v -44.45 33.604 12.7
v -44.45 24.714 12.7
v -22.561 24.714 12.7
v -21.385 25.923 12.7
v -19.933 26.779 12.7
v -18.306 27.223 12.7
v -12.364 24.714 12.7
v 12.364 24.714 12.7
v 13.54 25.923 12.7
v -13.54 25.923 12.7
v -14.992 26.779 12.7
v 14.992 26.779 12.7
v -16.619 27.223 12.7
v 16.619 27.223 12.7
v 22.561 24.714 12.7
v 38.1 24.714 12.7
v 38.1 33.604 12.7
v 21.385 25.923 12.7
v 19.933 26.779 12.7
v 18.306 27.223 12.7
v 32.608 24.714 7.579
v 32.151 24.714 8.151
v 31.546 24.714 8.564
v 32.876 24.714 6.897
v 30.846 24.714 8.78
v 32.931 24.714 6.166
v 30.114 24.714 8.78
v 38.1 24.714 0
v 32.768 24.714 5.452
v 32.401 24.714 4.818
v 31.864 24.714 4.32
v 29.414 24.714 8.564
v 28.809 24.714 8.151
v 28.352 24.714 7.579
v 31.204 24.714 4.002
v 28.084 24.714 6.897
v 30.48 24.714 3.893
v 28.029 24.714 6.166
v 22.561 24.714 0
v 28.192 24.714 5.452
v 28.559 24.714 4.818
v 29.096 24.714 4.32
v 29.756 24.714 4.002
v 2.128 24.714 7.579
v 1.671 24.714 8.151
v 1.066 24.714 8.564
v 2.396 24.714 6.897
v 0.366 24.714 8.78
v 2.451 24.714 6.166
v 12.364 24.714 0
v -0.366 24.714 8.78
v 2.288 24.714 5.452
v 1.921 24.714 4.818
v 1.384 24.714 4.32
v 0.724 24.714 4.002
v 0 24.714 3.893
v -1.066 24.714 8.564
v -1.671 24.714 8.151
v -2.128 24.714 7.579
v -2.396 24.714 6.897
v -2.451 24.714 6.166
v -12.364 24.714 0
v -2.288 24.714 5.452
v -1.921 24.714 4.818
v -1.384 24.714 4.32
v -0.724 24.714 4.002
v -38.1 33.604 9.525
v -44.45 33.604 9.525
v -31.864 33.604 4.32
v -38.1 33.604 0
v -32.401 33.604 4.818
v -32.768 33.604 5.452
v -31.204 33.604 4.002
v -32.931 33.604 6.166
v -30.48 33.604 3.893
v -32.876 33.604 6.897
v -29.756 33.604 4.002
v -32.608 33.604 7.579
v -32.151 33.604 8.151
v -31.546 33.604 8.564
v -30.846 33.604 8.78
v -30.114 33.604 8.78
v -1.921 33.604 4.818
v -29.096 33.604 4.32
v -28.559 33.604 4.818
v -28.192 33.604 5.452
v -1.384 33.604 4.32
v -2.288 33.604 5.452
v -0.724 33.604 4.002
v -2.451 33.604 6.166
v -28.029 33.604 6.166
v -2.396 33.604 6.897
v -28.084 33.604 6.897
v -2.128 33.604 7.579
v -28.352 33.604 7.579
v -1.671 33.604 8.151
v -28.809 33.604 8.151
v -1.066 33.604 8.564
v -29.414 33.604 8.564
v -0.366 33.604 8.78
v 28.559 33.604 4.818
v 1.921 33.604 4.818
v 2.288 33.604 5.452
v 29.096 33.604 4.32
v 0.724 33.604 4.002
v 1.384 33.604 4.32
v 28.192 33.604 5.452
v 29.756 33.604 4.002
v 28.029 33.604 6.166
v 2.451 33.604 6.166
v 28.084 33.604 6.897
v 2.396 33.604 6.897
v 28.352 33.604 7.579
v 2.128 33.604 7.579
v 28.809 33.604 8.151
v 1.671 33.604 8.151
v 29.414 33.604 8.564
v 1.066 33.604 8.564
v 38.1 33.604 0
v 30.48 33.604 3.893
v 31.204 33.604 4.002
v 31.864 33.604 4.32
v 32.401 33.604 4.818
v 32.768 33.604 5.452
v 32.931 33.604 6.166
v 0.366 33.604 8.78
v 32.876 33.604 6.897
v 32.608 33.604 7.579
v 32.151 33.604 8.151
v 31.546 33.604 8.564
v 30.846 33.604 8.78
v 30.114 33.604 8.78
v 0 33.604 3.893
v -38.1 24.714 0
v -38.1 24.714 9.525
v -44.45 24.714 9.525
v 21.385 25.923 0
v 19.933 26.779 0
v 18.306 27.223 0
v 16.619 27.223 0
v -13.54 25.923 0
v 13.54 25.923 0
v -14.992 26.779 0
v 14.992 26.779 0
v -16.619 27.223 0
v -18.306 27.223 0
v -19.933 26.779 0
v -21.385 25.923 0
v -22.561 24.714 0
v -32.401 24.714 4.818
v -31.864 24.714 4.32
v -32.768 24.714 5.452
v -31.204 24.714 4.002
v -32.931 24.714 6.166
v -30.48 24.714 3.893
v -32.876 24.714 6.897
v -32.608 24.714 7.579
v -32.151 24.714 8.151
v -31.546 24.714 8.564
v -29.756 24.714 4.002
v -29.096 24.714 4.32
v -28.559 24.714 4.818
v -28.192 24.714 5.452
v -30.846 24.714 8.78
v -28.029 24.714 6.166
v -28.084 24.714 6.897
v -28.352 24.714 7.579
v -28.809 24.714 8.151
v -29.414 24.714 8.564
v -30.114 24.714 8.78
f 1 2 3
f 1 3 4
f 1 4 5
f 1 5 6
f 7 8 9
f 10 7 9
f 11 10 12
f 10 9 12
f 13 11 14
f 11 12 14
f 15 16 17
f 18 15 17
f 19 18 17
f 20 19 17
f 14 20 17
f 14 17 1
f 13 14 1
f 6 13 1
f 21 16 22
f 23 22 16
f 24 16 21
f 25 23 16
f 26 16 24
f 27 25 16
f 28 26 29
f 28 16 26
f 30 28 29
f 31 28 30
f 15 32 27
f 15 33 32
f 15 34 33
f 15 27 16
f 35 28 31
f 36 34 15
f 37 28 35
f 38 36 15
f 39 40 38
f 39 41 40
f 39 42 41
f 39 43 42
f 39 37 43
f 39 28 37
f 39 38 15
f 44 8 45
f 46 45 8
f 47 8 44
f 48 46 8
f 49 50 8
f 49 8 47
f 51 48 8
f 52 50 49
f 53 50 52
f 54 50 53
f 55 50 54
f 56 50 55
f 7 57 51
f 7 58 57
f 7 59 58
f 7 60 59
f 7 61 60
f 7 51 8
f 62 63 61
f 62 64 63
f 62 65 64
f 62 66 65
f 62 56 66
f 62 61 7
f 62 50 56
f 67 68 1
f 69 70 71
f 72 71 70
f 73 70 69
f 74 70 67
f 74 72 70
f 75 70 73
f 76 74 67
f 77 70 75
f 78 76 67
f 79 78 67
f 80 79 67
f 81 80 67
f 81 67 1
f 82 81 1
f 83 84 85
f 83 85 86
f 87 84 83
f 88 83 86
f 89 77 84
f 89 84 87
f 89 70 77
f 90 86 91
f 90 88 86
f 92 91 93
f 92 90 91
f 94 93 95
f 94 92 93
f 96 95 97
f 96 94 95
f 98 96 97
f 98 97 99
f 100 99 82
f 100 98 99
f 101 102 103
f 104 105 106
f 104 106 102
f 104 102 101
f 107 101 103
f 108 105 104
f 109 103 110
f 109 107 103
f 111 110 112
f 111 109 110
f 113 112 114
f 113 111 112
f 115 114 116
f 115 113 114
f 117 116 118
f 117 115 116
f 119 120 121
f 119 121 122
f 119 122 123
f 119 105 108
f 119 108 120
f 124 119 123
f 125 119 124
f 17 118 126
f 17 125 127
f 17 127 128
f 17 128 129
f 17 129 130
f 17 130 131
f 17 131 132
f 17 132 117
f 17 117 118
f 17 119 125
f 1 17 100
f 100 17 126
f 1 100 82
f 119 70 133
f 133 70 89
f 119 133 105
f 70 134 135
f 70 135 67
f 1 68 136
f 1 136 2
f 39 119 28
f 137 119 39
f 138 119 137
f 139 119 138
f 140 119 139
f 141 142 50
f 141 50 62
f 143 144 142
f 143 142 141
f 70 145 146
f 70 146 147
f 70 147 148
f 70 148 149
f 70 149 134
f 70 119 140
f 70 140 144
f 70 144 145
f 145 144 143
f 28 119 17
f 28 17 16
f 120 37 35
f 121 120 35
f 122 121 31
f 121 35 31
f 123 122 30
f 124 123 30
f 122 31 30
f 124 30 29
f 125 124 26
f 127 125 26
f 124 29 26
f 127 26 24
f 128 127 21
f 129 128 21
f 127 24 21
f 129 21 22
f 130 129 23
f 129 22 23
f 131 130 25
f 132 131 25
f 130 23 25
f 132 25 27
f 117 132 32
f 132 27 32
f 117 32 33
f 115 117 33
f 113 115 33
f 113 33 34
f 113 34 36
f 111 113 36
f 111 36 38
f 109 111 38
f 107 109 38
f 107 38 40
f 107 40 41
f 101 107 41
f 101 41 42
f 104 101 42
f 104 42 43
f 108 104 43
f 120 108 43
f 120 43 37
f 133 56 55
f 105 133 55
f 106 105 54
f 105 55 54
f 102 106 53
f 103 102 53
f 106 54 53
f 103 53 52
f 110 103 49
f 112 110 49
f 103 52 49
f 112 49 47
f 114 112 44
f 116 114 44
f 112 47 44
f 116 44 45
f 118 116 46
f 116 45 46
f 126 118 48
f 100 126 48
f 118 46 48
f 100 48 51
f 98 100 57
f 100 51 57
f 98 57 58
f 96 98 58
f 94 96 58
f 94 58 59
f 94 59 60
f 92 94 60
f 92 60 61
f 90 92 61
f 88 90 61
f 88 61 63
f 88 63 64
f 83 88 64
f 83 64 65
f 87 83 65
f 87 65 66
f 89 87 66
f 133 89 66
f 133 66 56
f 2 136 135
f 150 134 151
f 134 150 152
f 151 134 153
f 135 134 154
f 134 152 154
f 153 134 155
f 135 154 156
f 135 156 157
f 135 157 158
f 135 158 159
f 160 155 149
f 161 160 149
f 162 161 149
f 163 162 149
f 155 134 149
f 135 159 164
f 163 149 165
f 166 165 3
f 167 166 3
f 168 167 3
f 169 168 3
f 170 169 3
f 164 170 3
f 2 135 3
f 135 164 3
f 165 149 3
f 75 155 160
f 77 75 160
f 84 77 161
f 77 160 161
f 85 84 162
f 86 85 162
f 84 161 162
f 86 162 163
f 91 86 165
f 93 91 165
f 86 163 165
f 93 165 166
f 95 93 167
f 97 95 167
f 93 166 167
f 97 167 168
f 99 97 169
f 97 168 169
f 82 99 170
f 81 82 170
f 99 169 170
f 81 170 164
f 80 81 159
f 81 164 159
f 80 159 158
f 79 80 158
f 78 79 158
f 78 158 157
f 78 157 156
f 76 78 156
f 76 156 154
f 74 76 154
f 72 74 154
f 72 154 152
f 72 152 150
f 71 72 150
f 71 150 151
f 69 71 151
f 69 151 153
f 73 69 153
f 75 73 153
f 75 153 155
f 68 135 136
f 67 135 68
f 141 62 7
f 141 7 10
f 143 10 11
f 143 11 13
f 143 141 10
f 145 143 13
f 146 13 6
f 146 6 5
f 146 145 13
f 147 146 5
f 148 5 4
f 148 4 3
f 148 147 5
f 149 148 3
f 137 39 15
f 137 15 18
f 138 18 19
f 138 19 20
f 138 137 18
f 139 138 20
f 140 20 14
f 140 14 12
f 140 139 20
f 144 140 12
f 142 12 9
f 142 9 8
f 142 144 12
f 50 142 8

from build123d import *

# Parameters (mm, degrees)
BOSS_EXTRUDE1_DEPTH          = 12.7
SKETCH2_W                    = 3.175
SKETCH2_H                    = 8.89
BOSS_EXTRUDE2_DEPTH          = 6.35
F_10_0_1935_DIAMETER_HOLE1_D = 4.9149


with BuildPart() as part:
    # Sketch1 → Boss-Extrude1 (new body)
    with BuildSketch(Plane.XY):
        with BuildLine():
            Line((38.1, 33.6042), (38.1, 24.7142))
            Line((38.1, 24.7142), (22.561451151, 24.7142))
            ThreePointArc((22.561451151, 24.7142), (17.4625, 27.2796), (12.363548849, 24.7142))
            Line((12.363548849, 24.7142), (-12.363548849, 24.7142))
            ThreePointArc((-12.363548849, 24.7142), (-17.4625, 27.2796), (-22.561451151, 24.7142))
            Line((-22.561451151, 24.7142), (-38.1, 24.7142))
            Line((-38.1, 24.7142), (-38.1, 33.6042))
            Line((-38.1, 33.6042), (38.1, 33.6042))
        make_face()
    extrude(amount=BOSS_EXTRUDE1_DEPTH)

    # Sketch2 → Boss-Extrude2 (add)
    with BuildSketch(Plane.ZY.offset(38.1)):
        with Locations((11.1125, 29.1592)):
            Rectangle(SKETCH2_W, SKETCH2_H)
    extrude(amount=BOSS_EXTRUDE2_DEPTH)

    # #10 (0.1935) Diameter Hole1 (through all)
    with Locations(Plane(origin=(-30.48, 33.6042, 6.35), x_dir=(0, 0, 1), z_dir=(0, 1, 0))):
        with Locations((0, 0), (0, 30.48), (0, 60.96)):
            Hole(F_10_0_1935_DIAMETER_HOLE1_D / 2)


solid = part.part
